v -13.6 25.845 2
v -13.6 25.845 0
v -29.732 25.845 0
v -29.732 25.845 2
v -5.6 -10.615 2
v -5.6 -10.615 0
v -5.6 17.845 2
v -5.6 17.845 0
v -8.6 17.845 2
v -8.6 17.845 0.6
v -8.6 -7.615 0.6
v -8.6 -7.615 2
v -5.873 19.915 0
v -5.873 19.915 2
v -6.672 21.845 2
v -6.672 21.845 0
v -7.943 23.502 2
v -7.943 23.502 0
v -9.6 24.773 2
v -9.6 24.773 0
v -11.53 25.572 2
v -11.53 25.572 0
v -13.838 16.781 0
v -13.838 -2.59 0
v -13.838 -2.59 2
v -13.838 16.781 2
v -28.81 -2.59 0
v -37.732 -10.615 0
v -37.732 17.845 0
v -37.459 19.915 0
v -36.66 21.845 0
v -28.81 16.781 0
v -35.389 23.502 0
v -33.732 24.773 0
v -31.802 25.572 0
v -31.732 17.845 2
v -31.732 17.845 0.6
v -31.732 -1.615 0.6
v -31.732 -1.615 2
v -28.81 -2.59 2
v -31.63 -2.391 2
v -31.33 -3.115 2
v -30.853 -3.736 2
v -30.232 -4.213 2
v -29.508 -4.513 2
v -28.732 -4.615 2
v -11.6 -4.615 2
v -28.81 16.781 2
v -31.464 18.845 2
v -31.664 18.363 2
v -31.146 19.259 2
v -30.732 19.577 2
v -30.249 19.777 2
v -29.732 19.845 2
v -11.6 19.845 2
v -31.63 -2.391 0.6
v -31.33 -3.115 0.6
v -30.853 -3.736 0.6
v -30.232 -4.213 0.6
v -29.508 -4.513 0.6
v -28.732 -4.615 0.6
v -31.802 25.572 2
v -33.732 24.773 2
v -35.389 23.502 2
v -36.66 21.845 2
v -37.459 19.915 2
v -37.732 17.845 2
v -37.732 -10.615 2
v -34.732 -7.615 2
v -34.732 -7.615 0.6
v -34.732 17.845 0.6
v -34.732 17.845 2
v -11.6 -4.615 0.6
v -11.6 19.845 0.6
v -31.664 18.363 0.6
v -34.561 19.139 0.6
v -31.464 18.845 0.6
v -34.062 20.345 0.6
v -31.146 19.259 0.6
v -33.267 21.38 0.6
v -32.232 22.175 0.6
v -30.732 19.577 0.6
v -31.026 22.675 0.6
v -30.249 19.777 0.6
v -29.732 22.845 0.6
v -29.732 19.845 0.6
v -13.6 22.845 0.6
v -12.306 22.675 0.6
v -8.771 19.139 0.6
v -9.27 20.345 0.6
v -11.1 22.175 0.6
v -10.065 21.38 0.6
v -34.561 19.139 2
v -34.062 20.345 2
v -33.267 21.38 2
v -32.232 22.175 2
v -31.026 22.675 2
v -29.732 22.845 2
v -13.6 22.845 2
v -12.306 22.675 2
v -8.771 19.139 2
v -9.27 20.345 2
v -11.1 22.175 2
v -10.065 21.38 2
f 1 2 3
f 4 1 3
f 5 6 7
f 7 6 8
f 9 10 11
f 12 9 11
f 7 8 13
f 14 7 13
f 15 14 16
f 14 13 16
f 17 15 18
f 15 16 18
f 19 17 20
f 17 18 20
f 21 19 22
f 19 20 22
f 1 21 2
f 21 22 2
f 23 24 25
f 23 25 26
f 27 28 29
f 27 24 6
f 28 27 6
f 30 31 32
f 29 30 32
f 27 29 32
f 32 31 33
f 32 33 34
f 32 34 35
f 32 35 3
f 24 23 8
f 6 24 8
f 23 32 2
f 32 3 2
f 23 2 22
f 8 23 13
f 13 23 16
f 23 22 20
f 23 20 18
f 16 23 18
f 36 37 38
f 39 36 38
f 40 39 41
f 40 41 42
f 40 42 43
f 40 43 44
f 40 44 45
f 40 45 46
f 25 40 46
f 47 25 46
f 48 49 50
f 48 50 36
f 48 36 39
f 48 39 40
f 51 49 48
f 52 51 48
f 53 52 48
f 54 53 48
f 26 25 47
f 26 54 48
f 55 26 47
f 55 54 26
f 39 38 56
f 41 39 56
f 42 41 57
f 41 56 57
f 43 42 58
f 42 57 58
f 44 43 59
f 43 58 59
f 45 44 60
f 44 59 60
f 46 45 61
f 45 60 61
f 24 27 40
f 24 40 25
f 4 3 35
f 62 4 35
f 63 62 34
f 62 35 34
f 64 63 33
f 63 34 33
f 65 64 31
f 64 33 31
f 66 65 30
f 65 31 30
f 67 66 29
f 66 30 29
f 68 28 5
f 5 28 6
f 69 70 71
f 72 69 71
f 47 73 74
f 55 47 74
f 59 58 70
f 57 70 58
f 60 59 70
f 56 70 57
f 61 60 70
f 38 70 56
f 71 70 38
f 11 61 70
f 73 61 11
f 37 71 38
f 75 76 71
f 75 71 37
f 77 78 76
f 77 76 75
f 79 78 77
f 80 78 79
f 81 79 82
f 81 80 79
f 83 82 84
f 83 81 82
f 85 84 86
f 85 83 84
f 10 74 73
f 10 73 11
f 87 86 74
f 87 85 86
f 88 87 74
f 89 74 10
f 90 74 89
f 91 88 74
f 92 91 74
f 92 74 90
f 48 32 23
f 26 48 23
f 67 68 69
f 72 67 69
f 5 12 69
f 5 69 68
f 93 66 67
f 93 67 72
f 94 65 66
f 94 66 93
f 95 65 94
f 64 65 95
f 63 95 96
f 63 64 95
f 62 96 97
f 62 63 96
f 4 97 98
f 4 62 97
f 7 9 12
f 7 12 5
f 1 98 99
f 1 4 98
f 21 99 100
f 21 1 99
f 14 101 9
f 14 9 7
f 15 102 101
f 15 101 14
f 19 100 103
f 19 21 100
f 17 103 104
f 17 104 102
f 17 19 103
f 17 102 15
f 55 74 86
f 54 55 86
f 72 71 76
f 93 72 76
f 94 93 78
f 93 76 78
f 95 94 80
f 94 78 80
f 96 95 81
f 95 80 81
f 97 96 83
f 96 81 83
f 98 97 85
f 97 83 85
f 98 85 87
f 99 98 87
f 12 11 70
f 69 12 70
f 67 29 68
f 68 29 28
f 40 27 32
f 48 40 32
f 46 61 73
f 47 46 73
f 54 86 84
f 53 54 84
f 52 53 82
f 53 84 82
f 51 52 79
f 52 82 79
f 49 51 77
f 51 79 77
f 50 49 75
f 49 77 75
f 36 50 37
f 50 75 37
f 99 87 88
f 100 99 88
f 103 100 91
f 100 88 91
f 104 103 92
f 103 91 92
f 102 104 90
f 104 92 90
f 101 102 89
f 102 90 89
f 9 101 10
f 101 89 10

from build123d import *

# Parameters (mm, degrees)
F1_DEPTH = 0.6
F0_W     = 14.97182
F0_H     = 19.371433
F2_DEPTH = 2


with BuildPart() as f1:
    # F0 (on Top) → F1 (new body)
    with BuildSketch(Plane.XY):
        with BuildLine():
            Line((-13.600235, 22.844931), (-29.731723, 22.844931))
            ThreePointArc((-29.731723, 22.844931), (-33.267257, 21.380465), (-34.731723, 17.844931))
            Line((-34.731723, 17.844931), (-34.731723, -7.614977))
            Line((-34.731723, -7.614977), (-8.600235, -7.614977))
            Line((-8.600235, -7.614977), (-8.600235, 17.844931))
            ThreePointArc((-8.600235, 17.844931), (-10.064701, 21.380465), (-13.600235, 22.844931))
        make_face()
        with BuildLine():
            ThreePointArc((-31.731723, 17.844931), (-31.145937, 19.259145), (-29.731723, 19.844931))
            Line((-29.731723, 19.844931), (-11.600235, 19.844931))
            Line((-11.600235, 19.844931), (-11.600235, -4.614977))
            Line((-11.600235, -4.614977), (-28.731723, -4.614977))
            ThreePointArc((-28.731723, -4.614977), (-30.853044, -3.736297), (-31.731723, -1.614977))
            Line((-31.731723, -1.614977), (-31.731723, 17.844931))
        make_face(mode=Mode.SUBTRACT)
    extrude(amount=F1_DEPTH)

    # F0 (on Top) → F2 (join)
    with BuildSketch(Plane.XY):
        with BuildLine():
            Line((-13.600235, 25.844931), (-29.731723, 25.844931))
            ThreePointArc((-29.731723, 25.844931), (-35.388578, 23.501785), (-37.731723, 17.844931))
            Line((-37.731723, 17.844931), (-37.731723, -10.614977))
            Line((-37.731723, -10.614977), (-5.600235, -10.614977))
            Line((-5.600235, -10.614977), (-5.600235, 17.844931))
            ThreePointArc((-5.600235, 17.844931), (-7.943381, 23.501785), (-13.600235, 25.844931))
        make_face()
        with BuildLine():
            ThreePointArc((-34.731723, 17.844931), (-33.267257, 21.380465), (-29.731723, 22.844931))
            Line((-29.731723, 22.844931), (-13.600235, 22.844931))
            ThreePointArc((-13.600235, 22.844931), (-10.064701, 21.380465), (-8.600235, 17.844931))
            Line((-8.600235, 17.844931), (-8.600235, -7.614977))
            Line((-8.600235, -7.614977), (-34.731723, -7.614977))
            Line((-34.731723, -7.614977), (-34.731723, 17.844931))
        make_face(mode=Mode.SUBTRACT)
        with BuildLine():
            Line((-11.600235, 19.844931), (-29.731723, 19.844931))
            ThreePointArc((-29.731723, 19.844931), (-31.145937, 19.259145), (-31.731723, 17.844931))
            Line((-31.731723, 17.844931), (-31.731723, -1.614977))
            ThreePointArc((-31.731723, -1.614977), (-30.853044, -3.736297), (-28.731723, -4.614977))
            Line((-28.731723, -4.614977), (-11.600235, -4.614977))
            Line((-11.600235, -4.614977), (-11.600235, 19.844931))
        make_face()
        with Locations((-21.324334, 7.095438)):
            Rectangle(F0_W, F0_H, mode=Mode.SUBTRACT)
    extrude(amount=F2_DEPTH)


solid = f1.part
